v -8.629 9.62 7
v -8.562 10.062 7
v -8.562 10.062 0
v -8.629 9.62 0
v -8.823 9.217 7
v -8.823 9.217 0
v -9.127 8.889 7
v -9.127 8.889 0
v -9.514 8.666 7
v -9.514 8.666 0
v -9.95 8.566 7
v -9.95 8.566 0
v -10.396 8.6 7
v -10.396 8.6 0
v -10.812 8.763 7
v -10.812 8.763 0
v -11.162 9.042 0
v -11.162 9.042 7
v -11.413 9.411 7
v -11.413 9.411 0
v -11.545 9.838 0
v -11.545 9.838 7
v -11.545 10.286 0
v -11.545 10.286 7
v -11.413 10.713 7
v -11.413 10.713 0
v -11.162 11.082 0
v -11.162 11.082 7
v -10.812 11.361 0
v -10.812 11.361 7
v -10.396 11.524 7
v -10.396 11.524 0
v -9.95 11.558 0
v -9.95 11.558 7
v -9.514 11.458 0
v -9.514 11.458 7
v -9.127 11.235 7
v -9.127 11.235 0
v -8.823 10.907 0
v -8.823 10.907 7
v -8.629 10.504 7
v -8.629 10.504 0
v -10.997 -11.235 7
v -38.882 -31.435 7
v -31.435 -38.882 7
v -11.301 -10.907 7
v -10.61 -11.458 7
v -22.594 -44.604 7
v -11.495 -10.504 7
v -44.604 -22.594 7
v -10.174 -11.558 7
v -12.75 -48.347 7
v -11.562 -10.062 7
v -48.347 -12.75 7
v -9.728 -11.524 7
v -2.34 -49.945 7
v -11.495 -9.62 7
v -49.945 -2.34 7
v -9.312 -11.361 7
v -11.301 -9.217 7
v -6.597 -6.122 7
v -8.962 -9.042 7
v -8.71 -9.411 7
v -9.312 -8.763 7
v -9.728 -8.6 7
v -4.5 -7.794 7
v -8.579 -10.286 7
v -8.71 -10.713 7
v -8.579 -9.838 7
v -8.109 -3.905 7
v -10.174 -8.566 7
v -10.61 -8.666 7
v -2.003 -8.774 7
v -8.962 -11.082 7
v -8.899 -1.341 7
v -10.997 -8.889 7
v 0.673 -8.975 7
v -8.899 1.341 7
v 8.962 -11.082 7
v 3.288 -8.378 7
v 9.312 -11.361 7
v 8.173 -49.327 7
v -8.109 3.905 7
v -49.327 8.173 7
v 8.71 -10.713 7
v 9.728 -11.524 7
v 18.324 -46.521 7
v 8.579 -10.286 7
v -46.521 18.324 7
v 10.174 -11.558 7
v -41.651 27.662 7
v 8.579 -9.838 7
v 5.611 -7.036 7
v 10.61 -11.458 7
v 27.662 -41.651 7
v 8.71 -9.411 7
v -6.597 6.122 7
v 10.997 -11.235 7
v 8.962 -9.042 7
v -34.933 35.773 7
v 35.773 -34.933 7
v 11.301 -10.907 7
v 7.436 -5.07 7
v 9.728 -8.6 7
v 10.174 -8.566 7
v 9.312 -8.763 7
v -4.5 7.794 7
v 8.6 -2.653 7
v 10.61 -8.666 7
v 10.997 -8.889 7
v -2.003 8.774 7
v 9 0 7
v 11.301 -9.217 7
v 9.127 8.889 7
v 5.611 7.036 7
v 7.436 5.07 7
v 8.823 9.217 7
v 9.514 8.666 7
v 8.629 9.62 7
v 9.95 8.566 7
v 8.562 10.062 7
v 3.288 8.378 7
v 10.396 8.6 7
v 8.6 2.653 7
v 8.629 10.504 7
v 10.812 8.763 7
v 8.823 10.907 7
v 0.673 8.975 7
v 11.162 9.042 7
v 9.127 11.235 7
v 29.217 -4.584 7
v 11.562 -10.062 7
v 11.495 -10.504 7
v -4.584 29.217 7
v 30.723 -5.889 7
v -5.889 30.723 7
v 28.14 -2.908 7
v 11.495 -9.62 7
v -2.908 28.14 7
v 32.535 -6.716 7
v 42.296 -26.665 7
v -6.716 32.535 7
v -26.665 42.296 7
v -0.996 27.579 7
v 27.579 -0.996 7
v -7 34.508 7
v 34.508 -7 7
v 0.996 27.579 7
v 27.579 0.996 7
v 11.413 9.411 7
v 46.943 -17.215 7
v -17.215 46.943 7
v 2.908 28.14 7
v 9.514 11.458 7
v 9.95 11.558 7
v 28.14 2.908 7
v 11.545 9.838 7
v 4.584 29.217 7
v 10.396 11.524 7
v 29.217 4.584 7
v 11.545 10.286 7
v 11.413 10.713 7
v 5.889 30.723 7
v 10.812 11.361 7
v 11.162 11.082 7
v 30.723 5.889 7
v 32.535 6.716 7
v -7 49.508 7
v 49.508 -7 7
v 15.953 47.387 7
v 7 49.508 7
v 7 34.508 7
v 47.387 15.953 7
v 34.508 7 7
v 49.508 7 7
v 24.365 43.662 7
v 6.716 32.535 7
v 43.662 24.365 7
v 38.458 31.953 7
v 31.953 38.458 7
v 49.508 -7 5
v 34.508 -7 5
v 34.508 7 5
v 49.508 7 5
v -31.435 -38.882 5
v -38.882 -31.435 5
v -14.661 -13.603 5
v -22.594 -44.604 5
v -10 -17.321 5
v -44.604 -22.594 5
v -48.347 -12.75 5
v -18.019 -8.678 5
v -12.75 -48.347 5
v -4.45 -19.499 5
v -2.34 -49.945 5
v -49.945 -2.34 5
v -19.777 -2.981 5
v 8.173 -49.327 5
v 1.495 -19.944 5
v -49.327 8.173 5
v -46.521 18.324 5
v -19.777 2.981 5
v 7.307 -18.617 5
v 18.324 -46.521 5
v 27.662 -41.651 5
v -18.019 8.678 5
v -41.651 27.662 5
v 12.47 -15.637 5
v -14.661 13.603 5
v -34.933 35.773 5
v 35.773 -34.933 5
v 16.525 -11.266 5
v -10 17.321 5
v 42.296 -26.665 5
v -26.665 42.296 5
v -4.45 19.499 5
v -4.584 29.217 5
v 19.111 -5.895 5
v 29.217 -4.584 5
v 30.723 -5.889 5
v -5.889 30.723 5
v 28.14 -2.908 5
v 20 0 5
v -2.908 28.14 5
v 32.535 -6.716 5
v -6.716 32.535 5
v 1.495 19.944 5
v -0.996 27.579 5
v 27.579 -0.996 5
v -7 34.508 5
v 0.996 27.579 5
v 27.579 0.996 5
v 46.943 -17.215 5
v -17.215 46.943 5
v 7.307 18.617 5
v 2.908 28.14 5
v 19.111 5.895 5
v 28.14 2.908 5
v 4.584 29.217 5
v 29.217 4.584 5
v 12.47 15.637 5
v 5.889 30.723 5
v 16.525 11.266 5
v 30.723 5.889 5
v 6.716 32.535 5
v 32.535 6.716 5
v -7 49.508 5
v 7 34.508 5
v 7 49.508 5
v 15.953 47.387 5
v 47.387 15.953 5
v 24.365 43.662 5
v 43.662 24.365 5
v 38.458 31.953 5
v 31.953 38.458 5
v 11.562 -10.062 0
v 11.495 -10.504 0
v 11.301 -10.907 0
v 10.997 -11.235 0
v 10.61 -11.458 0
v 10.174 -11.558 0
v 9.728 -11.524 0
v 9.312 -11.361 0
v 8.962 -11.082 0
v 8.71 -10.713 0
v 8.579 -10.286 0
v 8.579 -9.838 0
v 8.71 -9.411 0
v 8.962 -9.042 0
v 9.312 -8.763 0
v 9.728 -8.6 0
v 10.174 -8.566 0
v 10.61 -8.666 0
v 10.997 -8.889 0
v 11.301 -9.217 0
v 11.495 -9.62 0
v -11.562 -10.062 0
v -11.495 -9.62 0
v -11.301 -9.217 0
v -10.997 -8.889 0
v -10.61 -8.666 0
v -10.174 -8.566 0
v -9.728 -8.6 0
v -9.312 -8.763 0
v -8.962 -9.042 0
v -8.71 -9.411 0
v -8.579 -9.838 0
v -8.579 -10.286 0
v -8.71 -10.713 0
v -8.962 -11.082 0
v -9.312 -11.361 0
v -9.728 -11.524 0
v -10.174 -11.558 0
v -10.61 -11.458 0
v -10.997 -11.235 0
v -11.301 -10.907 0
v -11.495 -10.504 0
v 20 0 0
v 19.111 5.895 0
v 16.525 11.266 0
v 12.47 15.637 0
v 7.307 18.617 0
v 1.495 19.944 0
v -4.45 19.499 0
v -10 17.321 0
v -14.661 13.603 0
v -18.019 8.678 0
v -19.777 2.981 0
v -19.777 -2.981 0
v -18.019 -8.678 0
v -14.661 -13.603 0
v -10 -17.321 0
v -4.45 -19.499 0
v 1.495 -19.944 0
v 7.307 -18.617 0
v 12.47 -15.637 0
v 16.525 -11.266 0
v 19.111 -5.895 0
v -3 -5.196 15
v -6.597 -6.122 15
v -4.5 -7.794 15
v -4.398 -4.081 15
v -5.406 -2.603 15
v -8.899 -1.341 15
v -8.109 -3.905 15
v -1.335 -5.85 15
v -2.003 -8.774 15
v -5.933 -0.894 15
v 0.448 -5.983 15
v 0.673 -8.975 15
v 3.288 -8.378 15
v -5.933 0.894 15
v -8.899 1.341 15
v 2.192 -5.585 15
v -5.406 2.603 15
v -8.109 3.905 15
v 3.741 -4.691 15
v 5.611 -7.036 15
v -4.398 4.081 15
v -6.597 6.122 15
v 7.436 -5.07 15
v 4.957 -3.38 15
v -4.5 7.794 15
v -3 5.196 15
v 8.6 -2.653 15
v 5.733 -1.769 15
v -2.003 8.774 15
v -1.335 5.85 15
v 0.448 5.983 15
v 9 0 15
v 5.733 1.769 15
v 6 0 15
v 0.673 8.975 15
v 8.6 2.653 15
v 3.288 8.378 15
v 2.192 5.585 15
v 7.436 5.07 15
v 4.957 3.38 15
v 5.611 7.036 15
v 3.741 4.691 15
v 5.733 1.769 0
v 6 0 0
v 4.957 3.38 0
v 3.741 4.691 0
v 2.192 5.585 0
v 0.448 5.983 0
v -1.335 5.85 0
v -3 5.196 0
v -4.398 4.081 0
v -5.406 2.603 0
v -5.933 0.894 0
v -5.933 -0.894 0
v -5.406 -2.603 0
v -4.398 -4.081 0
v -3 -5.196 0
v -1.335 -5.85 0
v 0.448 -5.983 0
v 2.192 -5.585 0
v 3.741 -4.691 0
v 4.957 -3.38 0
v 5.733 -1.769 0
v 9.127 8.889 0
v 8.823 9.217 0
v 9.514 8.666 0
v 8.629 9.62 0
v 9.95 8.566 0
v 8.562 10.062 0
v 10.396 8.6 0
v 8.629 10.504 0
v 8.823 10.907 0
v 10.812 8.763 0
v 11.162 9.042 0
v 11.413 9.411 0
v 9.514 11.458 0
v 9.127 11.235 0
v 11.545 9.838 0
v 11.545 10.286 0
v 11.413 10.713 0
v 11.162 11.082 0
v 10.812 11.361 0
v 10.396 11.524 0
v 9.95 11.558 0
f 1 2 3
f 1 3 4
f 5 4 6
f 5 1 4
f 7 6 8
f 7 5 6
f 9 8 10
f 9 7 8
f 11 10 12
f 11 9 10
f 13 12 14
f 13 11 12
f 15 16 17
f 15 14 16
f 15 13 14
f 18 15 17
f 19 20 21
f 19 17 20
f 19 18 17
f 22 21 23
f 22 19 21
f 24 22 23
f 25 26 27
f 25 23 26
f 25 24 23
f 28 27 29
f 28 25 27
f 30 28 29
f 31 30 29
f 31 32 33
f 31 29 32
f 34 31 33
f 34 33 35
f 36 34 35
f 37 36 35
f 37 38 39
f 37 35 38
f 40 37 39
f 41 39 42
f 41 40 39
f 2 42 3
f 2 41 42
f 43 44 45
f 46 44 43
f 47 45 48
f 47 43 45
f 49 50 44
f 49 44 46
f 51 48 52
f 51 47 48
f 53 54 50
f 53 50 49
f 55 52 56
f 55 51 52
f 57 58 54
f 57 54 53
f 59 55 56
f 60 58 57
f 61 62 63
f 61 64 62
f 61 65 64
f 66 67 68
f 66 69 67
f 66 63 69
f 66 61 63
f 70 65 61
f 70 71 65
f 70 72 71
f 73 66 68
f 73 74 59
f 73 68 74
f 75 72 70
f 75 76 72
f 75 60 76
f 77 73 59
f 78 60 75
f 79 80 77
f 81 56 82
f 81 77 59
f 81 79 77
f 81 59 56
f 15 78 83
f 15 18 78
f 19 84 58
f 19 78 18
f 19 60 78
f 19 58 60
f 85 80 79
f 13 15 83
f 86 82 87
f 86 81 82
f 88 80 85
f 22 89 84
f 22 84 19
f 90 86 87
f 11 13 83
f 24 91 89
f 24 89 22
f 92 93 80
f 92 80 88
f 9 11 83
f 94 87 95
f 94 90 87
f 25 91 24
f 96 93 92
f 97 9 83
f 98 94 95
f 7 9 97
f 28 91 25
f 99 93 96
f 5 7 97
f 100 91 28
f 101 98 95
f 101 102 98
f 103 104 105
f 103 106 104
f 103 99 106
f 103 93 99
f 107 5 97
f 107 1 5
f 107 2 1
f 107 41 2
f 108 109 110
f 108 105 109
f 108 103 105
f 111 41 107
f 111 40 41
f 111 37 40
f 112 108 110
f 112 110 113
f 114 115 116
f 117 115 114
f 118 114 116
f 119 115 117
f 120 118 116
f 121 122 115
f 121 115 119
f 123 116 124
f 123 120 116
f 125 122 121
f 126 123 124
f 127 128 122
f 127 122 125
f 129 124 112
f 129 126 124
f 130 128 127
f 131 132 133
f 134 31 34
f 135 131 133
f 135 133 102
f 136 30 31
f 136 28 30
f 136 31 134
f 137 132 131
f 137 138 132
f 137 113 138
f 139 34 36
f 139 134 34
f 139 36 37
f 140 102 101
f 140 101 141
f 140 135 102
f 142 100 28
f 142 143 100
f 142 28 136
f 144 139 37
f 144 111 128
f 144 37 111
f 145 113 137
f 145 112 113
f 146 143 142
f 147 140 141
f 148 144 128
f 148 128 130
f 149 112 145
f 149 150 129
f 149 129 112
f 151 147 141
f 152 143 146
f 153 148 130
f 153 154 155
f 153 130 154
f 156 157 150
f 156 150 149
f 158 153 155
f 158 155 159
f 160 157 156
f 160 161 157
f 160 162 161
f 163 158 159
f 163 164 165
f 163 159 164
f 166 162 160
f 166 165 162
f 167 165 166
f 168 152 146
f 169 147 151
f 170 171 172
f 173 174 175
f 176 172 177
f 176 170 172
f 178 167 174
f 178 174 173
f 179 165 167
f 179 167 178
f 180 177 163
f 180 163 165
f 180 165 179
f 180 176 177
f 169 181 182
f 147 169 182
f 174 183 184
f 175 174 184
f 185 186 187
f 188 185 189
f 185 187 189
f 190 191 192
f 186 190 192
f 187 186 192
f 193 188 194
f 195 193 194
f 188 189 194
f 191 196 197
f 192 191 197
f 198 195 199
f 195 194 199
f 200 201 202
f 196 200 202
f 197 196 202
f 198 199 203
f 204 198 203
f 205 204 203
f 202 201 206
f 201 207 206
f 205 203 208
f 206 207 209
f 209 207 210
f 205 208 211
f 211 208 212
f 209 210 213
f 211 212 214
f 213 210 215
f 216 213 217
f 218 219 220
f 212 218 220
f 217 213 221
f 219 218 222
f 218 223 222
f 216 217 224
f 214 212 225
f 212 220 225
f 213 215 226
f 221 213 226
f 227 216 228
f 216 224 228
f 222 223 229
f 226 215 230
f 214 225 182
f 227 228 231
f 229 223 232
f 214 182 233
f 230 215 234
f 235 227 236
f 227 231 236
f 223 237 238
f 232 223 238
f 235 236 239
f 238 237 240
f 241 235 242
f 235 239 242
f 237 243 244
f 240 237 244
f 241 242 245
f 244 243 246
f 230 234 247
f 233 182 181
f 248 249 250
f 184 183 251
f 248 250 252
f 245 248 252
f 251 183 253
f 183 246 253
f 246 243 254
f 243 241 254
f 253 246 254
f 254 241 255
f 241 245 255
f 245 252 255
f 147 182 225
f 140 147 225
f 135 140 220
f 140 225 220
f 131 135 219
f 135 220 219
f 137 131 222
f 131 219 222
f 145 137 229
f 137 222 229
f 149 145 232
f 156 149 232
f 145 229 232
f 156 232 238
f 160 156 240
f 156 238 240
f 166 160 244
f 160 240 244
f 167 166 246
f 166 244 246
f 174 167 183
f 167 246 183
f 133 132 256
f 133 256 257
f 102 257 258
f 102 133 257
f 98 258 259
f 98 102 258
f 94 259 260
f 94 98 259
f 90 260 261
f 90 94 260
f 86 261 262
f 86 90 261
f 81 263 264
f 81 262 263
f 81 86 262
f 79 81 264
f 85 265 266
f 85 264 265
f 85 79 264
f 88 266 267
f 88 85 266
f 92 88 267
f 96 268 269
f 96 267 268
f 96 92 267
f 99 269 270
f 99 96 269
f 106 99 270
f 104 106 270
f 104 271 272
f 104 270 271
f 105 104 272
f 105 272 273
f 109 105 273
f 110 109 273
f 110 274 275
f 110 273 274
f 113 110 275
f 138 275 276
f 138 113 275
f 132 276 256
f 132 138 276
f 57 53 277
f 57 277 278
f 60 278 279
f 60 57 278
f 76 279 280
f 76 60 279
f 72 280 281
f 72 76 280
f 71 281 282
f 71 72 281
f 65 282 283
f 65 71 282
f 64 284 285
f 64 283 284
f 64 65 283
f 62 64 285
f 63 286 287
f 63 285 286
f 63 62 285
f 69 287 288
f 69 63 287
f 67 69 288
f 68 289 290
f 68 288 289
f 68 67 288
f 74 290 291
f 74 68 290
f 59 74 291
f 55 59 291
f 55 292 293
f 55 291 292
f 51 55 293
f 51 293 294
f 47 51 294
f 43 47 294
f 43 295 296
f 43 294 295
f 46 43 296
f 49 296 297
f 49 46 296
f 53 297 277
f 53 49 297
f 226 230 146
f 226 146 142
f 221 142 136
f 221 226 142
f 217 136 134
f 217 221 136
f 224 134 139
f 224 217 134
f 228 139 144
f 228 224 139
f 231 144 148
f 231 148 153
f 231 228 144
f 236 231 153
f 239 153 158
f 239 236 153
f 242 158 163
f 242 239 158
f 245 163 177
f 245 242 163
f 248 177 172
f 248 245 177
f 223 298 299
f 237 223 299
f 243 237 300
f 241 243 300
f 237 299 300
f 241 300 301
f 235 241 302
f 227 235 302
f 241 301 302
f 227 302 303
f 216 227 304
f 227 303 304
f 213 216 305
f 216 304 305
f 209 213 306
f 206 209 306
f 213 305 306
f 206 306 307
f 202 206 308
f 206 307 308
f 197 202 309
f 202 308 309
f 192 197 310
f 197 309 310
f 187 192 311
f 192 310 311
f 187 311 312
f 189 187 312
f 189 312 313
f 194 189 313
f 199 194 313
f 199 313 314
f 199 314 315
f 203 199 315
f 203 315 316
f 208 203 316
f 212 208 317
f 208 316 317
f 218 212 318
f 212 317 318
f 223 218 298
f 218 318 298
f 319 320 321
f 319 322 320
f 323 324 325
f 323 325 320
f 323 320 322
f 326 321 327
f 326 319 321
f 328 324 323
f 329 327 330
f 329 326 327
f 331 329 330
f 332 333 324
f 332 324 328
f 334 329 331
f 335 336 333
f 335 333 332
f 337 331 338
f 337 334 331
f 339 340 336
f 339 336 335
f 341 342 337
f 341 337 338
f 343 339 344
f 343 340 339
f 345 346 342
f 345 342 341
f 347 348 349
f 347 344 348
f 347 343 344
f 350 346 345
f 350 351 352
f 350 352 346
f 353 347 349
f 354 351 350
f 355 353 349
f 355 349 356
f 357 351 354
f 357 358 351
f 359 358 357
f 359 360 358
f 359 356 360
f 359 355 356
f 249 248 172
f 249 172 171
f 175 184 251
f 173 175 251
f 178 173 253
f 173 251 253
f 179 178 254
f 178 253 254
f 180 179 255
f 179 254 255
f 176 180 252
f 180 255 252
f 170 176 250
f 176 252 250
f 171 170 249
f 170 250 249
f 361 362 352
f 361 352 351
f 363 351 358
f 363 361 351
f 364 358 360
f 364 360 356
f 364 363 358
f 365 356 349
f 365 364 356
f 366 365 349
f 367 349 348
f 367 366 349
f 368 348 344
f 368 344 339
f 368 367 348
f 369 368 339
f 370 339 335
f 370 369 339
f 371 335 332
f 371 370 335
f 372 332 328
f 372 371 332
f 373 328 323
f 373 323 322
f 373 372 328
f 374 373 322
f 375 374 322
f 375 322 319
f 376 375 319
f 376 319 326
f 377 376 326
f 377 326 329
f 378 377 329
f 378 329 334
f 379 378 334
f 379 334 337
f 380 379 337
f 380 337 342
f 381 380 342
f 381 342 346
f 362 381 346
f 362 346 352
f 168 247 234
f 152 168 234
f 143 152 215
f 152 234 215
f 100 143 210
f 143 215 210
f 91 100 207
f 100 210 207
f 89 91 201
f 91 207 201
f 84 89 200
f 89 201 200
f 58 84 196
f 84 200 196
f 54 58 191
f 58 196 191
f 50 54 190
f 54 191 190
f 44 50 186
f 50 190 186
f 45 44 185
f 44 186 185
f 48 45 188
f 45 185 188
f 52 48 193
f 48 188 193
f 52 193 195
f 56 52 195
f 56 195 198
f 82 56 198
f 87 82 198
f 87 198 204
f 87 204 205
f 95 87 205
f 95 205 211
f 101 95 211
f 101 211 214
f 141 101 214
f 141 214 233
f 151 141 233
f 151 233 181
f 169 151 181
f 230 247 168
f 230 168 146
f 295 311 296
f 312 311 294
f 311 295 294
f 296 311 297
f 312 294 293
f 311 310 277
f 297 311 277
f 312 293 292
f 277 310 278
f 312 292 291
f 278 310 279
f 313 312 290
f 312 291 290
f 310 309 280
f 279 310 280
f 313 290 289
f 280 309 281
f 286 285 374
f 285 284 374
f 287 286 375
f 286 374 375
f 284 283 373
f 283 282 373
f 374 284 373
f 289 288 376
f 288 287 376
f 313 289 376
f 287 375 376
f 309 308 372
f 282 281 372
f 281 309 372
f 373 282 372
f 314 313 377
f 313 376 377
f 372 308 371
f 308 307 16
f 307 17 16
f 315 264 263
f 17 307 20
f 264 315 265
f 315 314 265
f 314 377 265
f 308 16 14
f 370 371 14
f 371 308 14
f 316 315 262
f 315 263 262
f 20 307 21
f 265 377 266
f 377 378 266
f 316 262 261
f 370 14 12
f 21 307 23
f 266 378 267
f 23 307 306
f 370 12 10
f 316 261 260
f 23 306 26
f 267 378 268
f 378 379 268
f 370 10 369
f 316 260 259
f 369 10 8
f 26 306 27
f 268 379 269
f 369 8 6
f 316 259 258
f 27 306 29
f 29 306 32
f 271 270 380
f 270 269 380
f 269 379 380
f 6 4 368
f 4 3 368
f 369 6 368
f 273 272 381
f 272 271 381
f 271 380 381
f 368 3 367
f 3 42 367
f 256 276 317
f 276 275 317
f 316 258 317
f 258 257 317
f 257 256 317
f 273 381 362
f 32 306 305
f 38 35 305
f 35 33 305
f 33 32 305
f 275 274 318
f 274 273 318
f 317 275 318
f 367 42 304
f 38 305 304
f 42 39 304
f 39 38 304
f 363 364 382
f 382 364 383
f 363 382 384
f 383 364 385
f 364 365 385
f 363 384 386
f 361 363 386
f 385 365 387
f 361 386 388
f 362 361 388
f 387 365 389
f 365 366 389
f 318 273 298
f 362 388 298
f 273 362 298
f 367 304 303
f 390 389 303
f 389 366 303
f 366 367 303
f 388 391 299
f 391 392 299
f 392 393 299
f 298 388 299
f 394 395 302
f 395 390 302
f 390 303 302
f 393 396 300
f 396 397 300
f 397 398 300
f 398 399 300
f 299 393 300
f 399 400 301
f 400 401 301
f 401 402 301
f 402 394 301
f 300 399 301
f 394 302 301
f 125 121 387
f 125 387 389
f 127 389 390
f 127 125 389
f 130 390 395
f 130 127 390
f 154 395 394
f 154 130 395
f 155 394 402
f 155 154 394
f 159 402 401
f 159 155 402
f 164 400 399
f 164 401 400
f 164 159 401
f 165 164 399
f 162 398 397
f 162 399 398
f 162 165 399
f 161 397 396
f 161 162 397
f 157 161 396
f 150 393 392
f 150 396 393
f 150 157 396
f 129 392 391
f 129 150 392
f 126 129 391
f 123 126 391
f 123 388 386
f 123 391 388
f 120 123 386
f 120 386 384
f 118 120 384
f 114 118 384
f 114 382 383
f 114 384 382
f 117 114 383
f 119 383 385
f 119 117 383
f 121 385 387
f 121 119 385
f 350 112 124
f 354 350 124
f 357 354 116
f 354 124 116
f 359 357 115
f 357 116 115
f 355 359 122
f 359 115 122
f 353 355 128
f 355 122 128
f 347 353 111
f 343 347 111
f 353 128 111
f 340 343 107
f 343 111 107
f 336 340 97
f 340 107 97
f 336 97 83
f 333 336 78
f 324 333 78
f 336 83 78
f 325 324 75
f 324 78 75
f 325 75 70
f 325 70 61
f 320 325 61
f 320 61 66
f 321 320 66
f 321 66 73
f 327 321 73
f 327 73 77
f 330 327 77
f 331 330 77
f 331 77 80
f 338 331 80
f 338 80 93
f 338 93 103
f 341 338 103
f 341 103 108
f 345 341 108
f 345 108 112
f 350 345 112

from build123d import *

# Parameters (mm, degrees)
SKETCH1_R               = 20
SKETCH1_R_2             = 6
SKETCH1_R_3             = 1.5
BOSS_EXTRUDE1_DEPTH     = 5
SKETCH2_R               = 9
SKETCH2_R_2             = 6
BOSS_EXTRUDE2_DEPTH     = 10
SKETCH3_R               = 50
SKETCH3_R_2             = 6
BOSS_EXTRUDE3_DEPTH     = 2
CUT_EXTRUDE1_START      = -2
CUT_EXTRUDE1_DEPTH      = 2
CUT_EXTRUDE2_DEPTH      = 73.284161474
CUT_EXTRUDE2_DEPTH_BACK = 73.284161474
SKETCH5_R               = 1.5


with BuildPart() as part:
    # Sketch1 → Boss-Extrude1 (new body)
    with BuildSketch(Plane.XY):
        Circle(SKETCH1_R)
        Circle(SKETCH1_R_2, mode=Mode.SUBTRACT)
        with Locations((-10.061951403, 10.061951403)):
            Circle(SKETCH1_R_3, mode=Mode.SUBTRACT)
        with Locations(Location((10.061951403, 10.061951403, 0), (0, 0, 180))):
            Circle(SKETCH1_R_3, mode=Mode.SUBTRACT)
        with Locations((10.061951403, -10.061951403)):
            Circle(SKETCH1_R_3, mode=Mode.SUBTRACT)
        with Locations(Location((-10.061951403, -10.061951403, 0), (0, 0, 180))):
            Circle(SKETCH1_R_3, mode=Mode.SUBTRACT)
    extrude(amount=BOSS_EXTRUDE1_DEPTH)

    # Sketch2 → Boss-Extrude2 (add)
    with BuildSketch(Plane.XY.offset(5)):
        Circle(SKETCH2_R)
        Circle(SKETCH2_R_2, mode=Mode.SUBTRACT)
    extrude(amount=BOSS_EXTRUDE2_DEPTH)

    # Sketch3 → Boss-Extrude3 (add)
    with BuildSketch(Plane.XY.offset(5)):
        Circle(SKETCH3_R)
        Circle(SKETCH3_R_2, mode=Mode.SUBTRACT)
    extrude(amount=BOSS_EXTRUDE3_DEPTH)

    # Sketch4 → Cut-Extrude1 (cut)
    with BuildSketch(Plane.XY.offset(7).offset(CUT_EXTRUDE1_START)):
        with BuildLine():
            Line((-7, 49.507575178), (-7, 34.507575178))
            ThreePointArc((-7, 34.507575178), (0, 27.507575178), (7, 34.507575178))
            Line((7, 34.507575178), (7, 49.507575178))
            ThreePointArc((7, 49.507575178), (0, 50), (-7, 49.507575178))
        make_face()
        with BuildLine():
            Line((49.507575178, -7), (34.507575178, -7))
            ThreePointArc((34.507575178, -7), (27.507575178, 0), (34.507575178, 7))
            Line((34.507575178, 7), (49.507575178, 7))
            ThreePointArc((49.507575178, 7), (50, 0), (49.507575178, -7))
        make_face()
    extrude(amount=CUT_EXTRUDE1_DEPTH, mode=Mode.SUBTRACT)

    # Sketch5 → Cut-Extrude2 (cut, two sides: drawn at the far end of the back side and taken through both)
    with BuildSketch(Plane(origin=(0, 0, 0), x_dir=(-1, 0, 0), z_dir=(0, 0, -1)).offset(-CUT_EXTRUDE2_DEPTH_BACK)):
        with Locations((-10.061951403, 10.061951403)):
            Circle(SKETCH5_R)
        with Locations(Location((-10.061951403, -10.061951403, 0), (0, 0, 180))):
            Circle(SKETCH5_R)
        with Locations(Location((10.061951403, 10.061951403, 0), (0, 0, 180))):
            Circle(SKETCH5_R)
        with Locations((10.061951403, -10.061951403)):
            Circle(SKETCH5_R)
    extrude(amount=CUT_EXTRUDE2_DEPTH + CUT_EXTRUDE2_DEPTH_BACK, mode=Mode.SUBTRACT)


solid = part.part
